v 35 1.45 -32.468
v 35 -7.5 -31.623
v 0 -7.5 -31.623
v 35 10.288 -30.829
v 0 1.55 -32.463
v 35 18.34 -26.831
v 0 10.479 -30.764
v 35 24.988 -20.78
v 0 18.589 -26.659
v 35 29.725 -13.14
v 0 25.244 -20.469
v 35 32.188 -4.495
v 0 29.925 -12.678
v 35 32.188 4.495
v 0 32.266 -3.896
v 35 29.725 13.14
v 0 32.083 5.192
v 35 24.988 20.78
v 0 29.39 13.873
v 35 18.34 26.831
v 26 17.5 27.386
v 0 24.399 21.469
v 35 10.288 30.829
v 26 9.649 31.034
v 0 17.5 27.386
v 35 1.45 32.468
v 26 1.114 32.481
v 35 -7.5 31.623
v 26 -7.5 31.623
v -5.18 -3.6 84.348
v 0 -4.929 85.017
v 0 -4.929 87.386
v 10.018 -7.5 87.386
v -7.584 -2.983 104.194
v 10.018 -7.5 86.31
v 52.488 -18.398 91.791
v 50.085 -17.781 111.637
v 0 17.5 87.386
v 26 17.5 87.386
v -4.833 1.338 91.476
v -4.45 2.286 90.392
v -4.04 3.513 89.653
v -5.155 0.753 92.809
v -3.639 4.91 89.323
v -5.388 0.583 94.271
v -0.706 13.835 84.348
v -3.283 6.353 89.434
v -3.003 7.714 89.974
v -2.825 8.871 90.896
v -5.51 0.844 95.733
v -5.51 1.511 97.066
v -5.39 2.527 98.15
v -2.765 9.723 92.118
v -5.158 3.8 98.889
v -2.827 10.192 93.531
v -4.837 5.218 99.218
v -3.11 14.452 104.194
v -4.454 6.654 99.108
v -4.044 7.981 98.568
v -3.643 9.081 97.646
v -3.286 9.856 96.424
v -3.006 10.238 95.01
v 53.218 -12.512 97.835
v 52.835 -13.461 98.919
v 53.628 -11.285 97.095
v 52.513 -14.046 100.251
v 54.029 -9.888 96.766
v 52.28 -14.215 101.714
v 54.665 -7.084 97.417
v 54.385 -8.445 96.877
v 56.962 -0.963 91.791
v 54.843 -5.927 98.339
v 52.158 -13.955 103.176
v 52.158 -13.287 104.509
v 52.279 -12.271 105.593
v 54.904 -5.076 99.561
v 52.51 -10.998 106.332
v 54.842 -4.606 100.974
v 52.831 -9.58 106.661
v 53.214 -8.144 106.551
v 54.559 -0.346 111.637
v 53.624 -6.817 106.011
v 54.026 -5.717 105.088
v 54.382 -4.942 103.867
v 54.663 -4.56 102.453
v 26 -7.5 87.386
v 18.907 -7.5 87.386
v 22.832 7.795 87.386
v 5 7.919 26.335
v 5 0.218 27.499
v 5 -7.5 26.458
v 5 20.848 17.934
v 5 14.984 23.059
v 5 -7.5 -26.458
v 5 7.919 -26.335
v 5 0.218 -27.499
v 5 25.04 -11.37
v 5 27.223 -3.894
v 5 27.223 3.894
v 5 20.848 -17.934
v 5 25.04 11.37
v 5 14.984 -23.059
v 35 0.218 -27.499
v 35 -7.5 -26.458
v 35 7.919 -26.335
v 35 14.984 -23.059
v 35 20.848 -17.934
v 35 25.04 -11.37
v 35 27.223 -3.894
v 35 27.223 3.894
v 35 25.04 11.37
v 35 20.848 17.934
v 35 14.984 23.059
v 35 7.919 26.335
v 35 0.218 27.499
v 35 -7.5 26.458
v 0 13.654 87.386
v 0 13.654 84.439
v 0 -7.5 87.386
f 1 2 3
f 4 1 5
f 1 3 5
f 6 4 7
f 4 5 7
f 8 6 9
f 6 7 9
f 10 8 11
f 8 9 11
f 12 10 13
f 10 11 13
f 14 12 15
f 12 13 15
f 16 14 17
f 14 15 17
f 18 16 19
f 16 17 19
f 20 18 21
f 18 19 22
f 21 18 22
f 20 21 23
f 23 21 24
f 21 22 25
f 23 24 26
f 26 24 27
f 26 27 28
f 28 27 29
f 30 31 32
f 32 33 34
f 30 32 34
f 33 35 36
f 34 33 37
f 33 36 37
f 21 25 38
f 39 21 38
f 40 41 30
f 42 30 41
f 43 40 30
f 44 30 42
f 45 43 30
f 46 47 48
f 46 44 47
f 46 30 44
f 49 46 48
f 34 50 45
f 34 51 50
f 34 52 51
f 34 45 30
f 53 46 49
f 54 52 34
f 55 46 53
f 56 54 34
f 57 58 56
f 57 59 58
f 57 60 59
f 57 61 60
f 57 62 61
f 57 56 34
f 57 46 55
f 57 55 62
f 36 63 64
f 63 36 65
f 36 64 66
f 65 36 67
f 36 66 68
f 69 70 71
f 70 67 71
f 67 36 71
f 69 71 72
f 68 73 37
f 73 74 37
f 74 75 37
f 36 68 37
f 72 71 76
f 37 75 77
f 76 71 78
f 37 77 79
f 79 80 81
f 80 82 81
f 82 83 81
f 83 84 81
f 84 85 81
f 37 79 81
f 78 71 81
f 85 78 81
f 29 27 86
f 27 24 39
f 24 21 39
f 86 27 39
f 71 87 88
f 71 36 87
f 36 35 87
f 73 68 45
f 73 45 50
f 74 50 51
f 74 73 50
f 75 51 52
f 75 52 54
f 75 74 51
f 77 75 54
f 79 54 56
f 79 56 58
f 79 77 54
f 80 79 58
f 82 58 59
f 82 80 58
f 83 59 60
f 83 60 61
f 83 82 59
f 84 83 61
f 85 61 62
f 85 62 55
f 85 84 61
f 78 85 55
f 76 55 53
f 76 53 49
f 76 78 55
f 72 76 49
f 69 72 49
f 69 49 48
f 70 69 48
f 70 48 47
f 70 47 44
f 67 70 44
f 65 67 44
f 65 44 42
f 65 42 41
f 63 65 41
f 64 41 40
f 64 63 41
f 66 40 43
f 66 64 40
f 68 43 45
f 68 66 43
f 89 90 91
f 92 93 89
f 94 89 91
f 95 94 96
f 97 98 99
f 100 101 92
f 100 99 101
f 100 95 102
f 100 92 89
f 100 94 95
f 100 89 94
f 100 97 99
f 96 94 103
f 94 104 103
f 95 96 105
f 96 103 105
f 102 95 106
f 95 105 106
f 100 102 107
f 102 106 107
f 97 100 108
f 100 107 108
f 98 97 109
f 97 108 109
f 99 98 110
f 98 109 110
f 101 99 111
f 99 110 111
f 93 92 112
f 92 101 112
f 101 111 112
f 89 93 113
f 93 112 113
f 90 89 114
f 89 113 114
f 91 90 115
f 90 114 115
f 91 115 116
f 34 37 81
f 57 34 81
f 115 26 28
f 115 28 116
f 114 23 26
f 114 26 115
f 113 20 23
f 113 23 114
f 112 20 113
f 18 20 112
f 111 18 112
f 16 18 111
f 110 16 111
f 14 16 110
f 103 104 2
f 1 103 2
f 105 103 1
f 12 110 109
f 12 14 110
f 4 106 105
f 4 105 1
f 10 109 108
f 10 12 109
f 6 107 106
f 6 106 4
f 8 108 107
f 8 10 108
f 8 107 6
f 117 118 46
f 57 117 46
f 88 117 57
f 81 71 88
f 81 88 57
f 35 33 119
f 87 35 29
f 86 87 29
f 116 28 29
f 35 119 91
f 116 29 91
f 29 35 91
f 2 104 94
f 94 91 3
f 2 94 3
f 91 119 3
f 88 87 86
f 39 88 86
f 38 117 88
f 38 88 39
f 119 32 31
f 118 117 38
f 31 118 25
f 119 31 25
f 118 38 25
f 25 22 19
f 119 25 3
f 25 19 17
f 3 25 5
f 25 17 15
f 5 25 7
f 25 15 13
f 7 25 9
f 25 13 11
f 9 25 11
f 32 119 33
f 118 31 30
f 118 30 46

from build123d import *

# Parameters (mm, degrees)
EXTRUDE_1_DEPTH      = 35
SKETCH_6_W           = 60
SKETCH_6_H           = 25
EXTRUDE_2_DEPTH      = 26
SKETCH_4_R           = 27.5
CUT_EXTRUDE_1_DEPTH  = 30
EXTRUDE_3_DEPTH      = 22
EXTRUDE_3_DEPTH_BACK = 38
SKETCH_12_W          = 20
SKETCH_12_H          = 18
SKETCH_12_R          = 5


with BuildPart() as part:
    # 草图2 → 凸台-拉伸1 (new body)
    with BuildSketch(Plane(origin=(0, 0, 0), x_dir=(0, 0, -1), z_dir=(1, 0, 0))):
        with BuildLine():
            Line((-31.622776602, -7.5), (31.622776602, -7.5))
            ThreePointArc((31.622776602, -7.5), (0, 32.5), (-31.622776602, -7.5))
        make_face()
    extrude(amount=EXTRUDE_1_DEPTH)

    # 草图6 → 凸台-拉伸2 (add)
    with BuildSketch(Plane.ZY):
        with Locations((57.386127875, 5)):
            Rectangle(SKETCH_6_W, SKETCH_6_H)
    extrude(amount=-EXTRUDE_2_DEPTH)

    # 草图4 → 切除-拉伸1 (cut)
    with BuildSketch(Plane(origin=(35, 0, 0), x_dir=(0, 0, -1), z_dir=(1, 0, 0))):
        Circle(SKETCH_4_R)
    extrude(amount=-CUT_EXTRUDE_1_DEPTH, mode=Mode.SUBTRACT)

    # 草图12 → 凸台-拉伸3 (add, two sides: drawn at the far end of the back side and taken through both)
    with BuildSketch(Plane(origin=(17, 0, 97), x_dir=(-0.12015591727422713, 0.0308332759507369, 0.9922761030268414), z_dir=(-0.9611356730519813, 0.246637553152495, -0.12404892325959627)).offset(-EXTRUDE_3_DEPTH_BACK)):
        Rectangle(SKETCH_12_W, SKETCH_12_H)
        Circle(SKETCH_12_R, mode=Mode.SUBTRACT)
    extrude(amount=EXTRUDE_3_DEPTH + EXTRUDE_3_DEPTH_BACK)


solid = part.part
